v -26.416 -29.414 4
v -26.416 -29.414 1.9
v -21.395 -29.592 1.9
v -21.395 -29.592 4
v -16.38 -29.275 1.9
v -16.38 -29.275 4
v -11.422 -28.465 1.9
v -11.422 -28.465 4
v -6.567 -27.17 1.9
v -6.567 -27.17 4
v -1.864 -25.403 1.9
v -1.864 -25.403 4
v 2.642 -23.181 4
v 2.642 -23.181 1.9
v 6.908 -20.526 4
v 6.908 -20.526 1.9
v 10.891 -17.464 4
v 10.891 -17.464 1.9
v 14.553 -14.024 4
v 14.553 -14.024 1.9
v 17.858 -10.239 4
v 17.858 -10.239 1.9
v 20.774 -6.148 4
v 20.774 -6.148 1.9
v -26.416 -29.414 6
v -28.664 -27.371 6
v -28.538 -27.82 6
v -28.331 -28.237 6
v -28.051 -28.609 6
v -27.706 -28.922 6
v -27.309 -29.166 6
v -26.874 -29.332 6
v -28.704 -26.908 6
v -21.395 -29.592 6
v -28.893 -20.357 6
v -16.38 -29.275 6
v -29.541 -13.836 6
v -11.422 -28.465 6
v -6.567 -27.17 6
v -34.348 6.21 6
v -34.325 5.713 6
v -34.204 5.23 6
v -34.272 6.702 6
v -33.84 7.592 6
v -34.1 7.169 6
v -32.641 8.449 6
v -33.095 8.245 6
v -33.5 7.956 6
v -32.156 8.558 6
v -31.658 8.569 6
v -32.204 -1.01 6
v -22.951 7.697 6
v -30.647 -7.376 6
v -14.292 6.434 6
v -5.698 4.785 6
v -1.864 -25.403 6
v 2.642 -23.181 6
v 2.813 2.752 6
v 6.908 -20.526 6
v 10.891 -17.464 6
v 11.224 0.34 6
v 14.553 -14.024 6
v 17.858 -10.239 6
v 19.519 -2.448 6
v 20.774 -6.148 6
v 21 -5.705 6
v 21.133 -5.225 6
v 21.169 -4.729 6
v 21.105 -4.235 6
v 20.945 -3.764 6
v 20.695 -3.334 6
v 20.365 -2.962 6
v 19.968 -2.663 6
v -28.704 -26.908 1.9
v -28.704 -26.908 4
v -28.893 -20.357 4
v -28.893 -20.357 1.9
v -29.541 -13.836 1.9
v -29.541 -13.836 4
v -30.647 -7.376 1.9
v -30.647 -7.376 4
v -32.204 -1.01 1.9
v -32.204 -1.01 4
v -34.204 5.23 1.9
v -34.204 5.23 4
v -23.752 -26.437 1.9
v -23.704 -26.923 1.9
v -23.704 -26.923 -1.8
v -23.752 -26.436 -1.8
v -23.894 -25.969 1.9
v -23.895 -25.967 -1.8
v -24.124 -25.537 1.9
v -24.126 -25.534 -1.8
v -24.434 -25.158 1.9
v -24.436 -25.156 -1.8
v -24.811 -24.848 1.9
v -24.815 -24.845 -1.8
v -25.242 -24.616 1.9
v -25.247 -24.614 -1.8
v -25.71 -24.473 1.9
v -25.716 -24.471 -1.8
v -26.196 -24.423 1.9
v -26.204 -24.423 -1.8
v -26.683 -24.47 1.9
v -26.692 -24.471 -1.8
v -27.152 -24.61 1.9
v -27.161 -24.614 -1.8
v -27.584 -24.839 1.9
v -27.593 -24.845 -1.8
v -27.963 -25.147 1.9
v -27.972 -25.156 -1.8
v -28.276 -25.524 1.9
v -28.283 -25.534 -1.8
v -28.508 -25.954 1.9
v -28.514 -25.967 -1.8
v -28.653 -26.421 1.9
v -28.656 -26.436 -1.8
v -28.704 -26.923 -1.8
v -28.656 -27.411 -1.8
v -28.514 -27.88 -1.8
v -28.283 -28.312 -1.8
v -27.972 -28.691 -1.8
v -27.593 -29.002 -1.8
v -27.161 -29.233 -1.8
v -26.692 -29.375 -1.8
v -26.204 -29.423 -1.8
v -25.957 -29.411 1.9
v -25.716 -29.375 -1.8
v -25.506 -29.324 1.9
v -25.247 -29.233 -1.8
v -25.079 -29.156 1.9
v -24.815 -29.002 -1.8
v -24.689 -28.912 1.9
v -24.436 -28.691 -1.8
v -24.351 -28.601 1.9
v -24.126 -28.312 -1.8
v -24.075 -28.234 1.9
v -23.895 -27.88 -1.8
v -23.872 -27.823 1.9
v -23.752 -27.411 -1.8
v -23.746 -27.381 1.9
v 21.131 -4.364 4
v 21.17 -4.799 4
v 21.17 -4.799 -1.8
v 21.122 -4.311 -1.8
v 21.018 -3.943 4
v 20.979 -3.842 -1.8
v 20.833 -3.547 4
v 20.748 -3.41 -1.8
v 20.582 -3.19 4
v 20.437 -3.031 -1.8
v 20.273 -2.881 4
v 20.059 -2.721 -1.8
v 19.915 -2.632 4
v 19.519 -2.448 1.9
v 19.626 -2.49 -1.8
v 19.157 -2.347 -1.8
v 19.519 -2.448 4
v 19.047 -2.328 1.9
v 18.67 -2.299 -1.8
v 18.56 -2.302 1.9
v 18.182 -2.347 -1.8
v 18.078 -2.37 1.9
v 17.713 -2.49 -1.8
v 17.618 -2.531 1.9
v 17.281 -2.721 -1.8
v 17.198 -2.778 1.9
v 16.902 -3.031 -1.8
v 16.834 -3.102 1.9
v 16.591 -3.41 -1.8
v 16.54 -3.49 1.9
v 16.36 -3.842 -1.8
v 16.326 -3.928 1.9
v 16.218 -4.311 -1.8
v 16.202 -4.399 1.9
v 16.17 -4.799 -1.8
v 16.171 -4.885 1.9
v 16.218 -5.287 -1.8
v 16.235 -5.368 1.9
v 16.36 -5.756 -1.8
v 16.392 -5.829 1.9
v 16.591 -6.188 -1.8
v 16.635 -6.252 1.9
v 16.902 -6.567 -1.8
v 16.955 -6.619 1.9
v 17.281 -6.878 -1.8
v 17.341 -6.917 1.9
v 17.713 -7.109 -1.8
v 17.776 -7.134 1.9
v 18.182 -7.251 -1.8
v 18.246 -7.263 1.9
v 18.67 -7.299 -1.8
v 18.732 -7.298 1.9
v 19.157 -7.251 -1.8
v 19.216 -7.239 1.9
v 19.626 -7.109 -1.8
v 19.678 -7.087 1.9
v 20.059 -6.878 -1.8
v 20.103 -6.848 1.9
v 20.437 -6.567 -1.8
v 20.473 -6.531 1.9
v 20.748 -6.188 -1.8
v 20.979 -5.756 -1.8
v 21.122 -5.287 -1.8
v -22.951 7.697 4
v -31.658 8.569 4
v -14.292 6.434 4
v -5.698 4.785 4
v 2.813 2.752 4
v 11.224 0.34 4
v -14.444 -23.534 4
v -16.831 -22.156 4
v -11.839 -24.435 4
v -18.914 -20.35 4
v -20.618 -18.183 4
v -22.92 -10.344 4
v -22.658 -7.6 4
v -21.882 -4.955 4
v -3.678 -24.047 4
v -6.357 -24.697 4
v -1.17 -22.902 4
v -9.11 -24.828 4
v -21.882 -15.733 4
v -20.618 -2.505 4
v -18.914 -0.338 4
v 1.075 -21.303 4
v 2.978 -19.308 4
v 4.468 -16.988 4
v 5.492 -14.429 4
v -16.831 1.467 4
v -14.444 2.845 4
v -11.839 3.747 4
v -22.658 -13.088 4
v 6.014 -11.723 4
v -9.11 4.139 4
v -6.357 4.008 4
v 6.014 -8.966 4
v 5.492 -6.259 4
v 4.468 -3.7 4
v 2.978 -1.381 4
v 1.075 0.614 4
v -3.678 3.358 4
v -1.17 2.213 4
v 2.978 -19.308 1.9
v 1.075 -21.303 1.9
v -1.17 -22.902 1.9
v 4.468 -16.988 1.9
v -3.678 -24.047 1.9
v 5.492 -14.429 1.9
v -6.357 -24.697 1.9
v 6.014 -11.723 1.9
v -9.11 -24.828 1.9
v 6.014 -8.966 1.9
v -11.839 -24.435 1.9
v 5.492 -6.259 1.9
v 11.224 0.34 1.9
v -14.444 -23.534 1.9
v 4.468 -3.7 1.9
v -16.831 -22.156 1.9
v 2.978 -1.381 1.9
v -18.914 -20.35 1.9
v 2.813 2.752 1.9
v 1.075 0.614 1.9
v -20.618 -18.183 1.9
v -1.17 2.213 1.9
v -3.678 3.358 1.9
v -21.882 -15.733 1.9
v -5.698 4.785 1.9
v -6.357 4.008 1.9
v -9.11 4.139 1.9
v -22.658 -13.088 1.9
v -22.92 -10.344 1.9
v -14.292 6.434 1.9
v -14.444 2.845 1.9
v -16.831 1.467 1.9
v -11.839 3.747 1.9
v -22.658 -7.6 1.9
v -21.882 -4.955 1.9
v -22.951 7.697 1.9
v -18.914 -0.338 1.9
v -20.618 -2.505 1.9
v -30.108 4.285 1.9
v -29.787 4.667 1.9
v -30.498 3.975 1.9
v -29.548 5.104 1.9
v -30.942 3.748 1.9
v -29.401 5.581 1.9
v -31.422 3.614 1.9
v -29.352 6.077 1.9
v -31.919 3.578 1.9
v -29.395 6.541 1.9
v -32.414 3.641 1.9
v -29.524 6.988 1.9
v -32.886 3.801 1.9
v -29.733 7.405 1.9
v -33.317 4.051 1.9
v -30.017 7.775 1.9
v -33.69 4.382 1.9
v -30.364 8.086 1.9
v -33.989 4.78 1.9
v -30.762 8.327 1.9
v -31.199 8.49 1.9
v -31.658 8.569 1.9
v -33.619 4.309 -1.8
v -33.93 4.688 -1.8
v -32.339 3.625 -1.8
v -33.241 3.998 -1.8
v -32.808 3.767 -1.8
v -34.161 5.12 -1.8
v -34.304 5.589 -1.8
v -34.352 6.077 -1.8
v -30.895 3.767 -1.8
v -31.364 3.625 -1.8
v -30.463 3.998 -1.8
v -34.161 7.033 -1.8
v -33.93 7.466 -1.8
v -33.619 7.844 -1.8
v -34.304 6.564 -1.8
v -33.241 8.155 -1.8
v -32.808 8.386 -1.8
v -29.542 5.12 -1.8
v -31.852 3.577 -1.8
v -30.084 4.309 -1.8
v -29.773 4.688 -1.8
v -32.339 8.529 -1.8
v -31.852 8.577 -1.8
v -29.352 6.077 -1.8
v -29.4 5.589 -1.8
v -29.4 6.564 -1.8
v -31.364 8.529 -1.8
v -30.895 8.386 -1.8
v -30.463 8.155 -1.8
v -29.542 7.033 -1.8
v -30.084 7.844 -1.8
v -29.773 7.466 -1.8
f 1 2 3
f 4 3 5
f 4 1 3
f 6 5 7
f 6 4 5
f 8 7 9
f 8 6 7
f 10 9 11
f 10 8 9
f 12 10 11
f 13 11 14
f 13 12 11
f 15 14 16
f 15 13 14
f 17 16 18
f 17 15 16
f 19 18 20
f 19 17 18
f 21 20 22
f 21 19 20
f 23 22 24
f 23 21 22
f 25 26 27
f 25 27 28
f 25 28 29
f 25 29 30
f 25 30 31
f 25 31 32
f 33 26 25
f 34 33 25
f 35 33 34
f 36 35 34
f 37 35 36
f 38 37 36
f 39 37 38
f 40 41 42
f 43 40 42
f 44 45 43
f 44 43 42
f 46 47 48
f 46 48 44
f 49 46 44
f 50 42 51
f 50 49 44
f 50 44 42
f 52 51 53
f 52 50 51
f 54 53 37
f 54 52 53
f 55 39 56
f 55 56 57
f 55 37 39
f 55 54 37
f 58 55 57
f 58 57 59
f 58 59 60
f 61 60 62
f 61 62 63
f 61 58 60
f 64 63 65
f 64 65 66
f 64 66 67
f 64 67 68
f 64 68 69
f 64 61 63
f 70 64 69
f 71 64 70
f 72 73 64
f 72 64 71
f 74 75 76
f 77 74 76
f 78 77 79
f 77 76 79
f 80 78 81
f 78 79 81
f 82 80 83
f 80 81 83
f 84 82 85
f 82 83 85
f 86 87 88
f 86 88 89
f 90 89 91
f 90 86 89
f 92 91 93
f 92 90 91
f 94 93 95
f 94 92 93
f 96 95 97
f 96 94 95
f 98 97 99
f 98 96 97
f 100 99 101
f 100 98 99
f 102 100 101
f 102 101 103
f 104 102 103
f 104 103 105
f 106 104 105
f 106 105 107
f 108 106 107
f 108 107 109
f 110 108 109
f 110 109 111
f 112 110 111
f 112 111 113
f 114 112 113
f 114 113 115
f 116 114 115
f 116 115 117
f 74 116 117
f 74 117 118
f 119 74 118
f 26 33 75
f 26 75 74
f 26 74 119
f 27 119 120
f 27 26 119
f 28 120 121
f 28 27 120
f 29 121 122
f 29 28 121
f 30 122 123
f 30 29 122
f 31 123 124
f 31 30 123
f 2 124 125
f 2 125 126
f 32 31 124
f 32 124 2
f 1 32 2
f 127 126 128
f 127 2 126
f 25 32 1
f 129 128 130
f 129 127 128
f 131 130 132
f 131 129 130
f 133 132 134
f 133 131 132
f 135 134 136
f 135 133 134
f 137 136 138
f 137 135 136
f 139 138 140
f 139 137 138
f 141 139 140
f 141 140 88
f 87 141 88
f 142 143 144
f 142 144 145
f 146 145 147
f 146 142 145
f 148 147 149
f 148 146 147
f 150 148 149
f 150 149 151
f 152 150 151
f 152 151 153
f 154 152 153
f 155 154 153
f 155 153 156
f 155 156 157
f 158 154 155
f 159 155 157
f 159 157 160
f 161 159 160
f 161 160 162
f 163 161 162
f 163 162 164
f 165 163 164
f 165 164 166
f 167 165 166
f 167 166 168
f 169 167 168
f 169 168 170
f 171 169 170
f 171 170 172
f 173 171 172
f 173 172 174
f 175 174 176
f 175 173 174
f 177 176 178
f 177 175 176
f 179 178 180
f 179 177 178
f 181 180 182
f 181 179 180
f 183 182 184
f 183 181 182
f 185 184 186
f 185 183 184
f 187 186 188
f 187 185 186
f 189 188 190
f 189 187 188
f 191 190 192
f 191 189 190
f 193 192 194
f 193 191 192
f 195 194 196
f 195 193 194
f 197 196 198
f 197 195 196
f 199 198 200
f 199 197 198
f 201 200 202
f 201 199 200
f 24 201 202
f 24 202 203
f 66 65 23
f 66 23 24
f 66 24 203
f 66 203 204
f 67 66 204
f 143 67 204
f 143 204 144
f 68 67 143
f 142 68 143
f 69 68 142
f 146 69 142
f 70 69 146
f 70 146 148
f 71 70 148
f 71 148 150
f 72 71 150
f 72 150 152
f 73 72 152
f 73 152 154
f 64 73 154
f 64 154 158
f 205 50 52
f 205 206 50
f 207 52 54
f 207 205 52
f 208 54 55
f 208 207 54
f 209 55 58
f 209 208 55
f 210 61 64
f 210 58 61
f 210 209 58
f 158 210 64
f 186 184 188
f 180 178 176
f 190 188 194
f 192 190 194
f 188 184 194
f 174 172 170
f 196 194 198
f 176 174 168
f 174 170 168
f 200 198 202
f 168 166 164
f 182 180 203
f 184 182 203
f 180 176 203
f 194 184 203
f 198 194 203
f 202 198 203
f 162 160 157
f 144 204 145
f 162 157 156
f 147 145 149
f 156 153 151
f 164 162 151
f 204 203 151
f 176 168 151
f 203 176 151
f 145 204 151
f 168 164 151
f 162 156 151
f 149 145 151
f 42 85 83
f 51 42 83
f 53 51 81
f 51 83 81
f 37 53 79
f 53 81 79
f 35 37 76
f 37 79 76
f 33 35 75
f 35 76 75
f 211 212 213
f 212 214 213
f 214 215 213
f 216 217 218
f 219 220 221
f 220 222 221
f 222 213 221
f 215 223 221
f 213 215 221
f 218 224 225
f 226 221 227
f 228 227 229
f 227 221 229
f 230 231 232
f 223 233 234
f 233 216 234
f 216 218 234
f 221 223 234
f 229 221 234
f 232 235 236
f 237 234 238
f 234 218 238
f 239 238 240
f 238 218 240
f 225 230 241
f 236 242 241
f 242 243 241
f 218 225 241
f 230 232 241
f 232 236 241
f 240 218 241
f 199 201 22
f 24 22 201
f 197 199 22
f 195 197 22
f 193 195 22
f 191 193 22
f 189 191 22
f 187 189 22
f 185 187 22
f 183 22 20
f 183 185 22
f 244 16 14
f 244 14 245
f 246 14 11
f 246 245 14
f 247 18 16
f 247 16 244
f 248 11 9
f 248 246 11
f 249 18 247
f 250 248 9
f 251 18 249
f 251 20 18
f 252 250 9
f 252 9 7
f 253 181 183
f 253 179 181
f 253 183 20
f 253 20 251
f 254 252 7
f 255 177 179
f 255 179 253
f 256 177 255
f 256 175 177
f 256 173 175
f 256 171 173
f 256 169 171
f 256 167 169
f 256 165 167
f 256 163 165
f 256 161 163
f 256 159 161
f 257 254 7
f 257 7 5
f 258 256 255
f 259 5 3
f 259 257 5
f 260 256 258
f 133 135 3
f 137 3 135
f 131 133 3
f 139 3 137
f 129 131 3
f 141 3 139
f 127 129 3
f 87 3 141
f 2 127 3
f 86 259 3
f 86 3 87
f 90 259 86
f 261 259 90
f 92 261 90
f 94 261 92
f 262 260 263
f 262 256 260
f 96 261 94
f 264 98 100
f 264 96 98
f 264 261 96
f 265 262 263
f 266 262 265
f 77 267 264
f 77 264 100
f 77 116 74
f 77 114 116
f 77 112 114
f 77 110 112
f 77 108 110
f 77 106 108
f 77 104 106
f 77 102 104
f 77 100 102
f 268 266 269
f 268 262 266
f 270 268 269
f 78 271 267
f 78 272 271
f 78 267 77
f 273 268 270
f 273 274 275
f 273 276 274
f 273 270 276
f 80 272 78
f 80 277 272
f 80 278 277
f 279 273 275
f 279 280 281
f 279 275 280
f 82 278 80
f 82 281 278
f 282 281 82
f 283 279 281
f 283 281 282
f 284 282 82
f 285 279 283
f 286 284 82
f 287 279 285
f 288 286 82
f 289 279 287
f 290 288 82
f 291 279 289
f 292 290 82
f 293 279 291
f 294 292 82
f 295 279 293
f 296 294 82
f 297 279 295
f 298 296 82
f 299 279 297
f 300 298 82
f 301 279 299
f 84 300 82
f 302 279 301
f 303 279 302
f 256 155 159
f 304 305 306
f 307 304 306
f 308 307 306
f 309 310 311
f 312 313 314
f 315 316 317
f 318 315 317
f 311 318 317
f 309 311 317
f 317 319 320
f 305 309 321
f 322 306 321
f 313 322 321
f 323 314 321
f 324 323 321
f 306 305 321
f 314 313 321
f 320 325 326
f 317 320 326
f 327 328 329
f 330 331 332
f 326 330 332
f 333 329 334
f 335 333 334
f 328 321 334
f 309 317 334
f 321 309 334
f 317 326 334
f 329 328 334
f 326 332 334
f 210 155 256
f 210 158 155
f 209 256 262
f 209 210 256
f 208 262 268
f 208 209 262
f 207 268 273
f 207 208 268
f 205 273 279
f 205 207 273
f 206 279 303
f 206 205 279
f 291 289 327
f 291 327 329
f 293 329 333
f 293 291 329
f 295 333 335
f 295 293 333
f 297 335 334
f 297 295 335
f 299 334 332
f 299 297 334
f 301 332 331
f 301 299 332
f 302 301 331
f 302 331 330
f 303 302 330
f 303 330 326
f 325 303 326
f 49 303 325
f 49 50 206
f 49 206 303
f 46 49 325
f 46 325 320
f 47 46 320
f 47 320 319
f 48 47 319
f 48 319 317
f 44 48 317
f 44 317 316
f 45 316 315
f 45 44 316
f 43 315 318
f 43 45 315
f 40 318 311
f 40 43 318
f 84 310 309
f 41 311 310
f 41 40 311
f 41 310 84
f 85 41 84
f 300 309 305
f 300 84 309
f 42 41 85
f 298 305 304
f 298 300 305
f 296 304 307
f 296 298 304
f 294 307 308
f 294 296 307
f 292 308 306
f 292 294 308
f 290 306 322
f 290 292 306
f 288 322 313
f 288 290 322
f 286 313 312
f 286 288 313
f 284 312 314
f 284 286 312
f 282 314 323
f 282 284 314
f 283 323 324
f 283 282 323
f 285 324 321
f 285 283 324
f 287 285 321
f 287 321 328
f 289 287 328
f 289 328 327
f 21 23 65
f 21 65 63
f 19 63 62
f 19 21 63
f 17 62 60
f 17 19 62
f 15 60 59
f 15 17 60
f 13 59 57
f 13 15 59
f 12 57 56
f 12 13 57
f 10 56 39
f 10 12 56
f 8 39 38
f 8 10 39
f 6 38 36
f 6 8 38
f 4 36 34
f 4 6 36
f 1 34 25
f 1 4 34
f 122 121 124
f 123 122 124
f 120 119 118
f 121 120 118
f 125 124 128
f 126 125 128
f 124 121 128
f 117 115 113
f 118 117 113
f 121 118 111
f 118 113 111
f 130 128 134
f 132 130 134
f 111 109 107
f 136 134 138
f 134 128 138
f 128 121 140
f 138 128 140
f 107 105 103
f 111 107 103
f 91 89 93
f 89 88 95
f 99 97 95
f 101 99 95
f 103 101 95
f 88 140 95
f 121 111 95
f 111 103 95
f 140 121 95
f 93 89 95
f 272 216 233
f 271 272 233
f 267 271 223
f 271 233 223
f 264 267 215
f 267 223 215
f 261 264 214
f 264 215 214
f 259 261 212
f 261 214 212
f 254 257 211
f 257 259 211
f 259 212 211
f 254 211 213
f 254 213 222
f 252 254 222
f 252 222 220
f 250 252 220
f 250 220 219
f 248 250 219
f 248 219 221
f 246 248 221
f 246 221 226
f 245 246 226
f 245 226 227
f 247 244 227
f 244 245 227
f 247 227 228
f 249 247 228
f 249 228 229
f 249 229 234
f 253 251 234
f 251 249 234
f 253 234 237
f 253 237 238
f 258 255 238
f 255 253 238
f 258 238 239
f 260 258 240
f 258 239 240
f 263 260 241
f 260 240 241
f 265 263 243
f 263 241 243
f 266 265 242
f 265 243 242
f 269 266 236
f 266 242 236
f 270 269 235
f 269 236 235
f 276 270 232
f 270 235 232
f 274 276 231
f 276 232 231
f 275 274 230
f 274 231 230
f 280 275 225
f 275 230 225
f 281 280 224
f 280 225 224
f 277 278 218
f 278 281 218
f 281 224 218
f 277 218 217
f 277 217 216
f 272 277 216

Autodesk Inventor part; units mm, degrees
ref_plane "РабПлоскость1" through (0, 0, 0) normal (0, 0, 1) x (1, 0, 0)
sketch "Эскиз1" plane through (0, 0, 0) normal (0, 0, 1) x (1, 0, 0)
  line L0 (-1.043, -24.4234) -> (-58.4202, -24.4234) projected
  line L1 (51.5798, -43.5766) -> (-1.043, -24.4234) projected
  line L2 (58.4202, -24.7827) -> (51.5798, -43.5766) projected
  line L3 (32.5787, -15.3772) -> (58.4202, -24.7827) projected
  arc A0 (3.5798, 23.5766) -> (32.5787, -15.3772) centre (44.0796, 23.4555) ccw projected
  line L4 (3.5798, 43.5766) -> (3.5798, 23.5766) projected
  line L5 (-24.4202, 43.5766) -> (3.5798, 43.5766) projected
  line L6 (-24.4202, 12.0766) -> (-24.4202, 43.5766) projected
  arc A1 (-31.4202, 3.5766) -> (-24.4202, 12.0766) centre (-31.8516, 11.0641) ccw projected
  line L7 (-58.4202, 3.5766) -> (-31.4202, 3.5766) projected
  line L8 (-58.4202, -24.4234) -> (-58.4202, 3.5766) projected
  circle A2 centre (-8.4202, -10.3442) radius 12 projected
  circle A3 centre (17.7065, 13.8766) radius 1.65 projected
  circle A4 centre (17.7065, -26.3234) radius 1.65 projected
  circle A5 centre (-32.2935, -26.3234) radius 1.65 projected
  circle A6 centre (-32.2935, 13.8766) radius 1.65 projected
  circle A7 centre (-32.2935, -26.3234) radius 1.65 projected
  circle A8 centre (17.7065, -26.3234) radius 1.65 projected
  circle A9 centre (17.7065, 13.8766) radius 1.65 projected
  circle A10 centre (-32.2935, 13.8766) radius 1.65 projected
  point P0 (0, 0)
ref_plane "РабПлоскость2" through (-8.4202, -10.3442, 4) normal (0, 0, 1) x (1, 0, 0)
sketch "Эскиз2" plane through (-8.4202, -10.3442, 4) normal (0, 0, 1) x (1, 0, 0)
  arc A0 (-17.9957, -19.0702) -> (29.1947, 4.1961) centre (-13.6832, 31.6735) ccw
  circle A1 centre (27.0898, 5.545) radius 2.5
  arc A2 (27.9391, 7.8963) -> (-23.2379, 18.9133) centre (-38.3302, -175.569) ccw
  circle A3 centre (-23.4314, 16.4208) radius 2.5
  arc A4 (-20.2839, -16.5633) -> (-25.7837, 15.5745) centre (-113.4568, -15.9687) ccw
  circle A5 centre (-17.784, -16.5792) radius 2.5
  point P0 (8.4202, 10.3442)
ref_plane "РабПлоскость3" through (-58.4202, -43.5766, -1.8) normal (0, 0, -1) x (0, 1, 0)
extrude "Выдавливание1" add sketch "Эскиз2" against normal up to surface (5.8 mm away) contours A5 | A1 | A3
ref_plane "РабПлоскость4" through (-22.4202, -24.3442, 2) normal (0, 0, -1) x (0, 1, 0)
extrude "Выдавливание2" add sketch "Эскиз2" along normal blind 2
sketch "Эскиз4" plane through (-8.4202, -10.3442, 4) normal (0, 0, -1) x (-1, 0, 0)
  circle A0 centre (0, 0) radius 14 projected
  circle A1 centre (0, 0) radius 14.5
  arc A2 (-29.1947, 4.1961) -> (17.9957, -19.0702) centre (13.6832, 31.6735) ccw projected
  arc A3 (25.7837, 15.5745) -> (20.2839, -16.5633) centre (113.4568, -15.9687) ccw projected
  arc A4 (23.2379, 18.9133) -> (-27.9391, 7.8963) centre (38.3302, -175.569) ccw projected
  arc A5 (20.2839, -16.5633) -> (17.9957, -19.0702) centre (17.784, -16.5792) ccw projected
  arc A6 (25.7837, 15.5745) -> (20.2839, -16.5633) centre (113.4568, -15.9687) ccw projected
  arc A7 (23.2379, 18.9133) -> (25.7837, 15.5745) centre (23.4314, 16.4208) ccw projected
  arc A8 (23.2379, 18.9133) -> (-27.9391, 7.8963) centre (38.3302, -175.569) ccw projected
  arc A9 (-29.1947, 4.1961) -> (-27.9391, 7.8963) centre (-27.0898, 5.545) ccw projected
  arc A10 (-29.1947, 4.1961) -> (17.9957, -19.0702) centre (13.6832, 31.6735) ccw projected
  point P0 (-8.4202, 10.3442)
  point P1 (17.9957, -19.0702)
  point P2 (20.2839, -16.5633)
  point P3 (25.7837, 15.5745)
  point P4 (23.2379, 18.9133)
  point P5 (-27.9391, 7.8963)
  point P6 (-29.1947, 4.1961)
  dimension "d4" = 0.5
extrude "Выдавливание3" add sketch "Эскиз4" along normal blind 2.1 contours A9 A4 A7 A3 A5 A2
sketch "Эскиз5" plane through (-8.4202, -10.3442, 1.9) normal (0, 0, -1) x (-1, 0, 0)
  circle A0 centre (0, 0) radius 14.5 projected
  circle A1 centre (0, 0) radius 12 projected
  circle A2 centre (0, 0) radius 12.5
  point P0 (-8.4202, 10.3442)
  dimension "d7" = 0.5
properties part number "ЛЦМК000002.00.00.00.00.15 Держатель батареи"
